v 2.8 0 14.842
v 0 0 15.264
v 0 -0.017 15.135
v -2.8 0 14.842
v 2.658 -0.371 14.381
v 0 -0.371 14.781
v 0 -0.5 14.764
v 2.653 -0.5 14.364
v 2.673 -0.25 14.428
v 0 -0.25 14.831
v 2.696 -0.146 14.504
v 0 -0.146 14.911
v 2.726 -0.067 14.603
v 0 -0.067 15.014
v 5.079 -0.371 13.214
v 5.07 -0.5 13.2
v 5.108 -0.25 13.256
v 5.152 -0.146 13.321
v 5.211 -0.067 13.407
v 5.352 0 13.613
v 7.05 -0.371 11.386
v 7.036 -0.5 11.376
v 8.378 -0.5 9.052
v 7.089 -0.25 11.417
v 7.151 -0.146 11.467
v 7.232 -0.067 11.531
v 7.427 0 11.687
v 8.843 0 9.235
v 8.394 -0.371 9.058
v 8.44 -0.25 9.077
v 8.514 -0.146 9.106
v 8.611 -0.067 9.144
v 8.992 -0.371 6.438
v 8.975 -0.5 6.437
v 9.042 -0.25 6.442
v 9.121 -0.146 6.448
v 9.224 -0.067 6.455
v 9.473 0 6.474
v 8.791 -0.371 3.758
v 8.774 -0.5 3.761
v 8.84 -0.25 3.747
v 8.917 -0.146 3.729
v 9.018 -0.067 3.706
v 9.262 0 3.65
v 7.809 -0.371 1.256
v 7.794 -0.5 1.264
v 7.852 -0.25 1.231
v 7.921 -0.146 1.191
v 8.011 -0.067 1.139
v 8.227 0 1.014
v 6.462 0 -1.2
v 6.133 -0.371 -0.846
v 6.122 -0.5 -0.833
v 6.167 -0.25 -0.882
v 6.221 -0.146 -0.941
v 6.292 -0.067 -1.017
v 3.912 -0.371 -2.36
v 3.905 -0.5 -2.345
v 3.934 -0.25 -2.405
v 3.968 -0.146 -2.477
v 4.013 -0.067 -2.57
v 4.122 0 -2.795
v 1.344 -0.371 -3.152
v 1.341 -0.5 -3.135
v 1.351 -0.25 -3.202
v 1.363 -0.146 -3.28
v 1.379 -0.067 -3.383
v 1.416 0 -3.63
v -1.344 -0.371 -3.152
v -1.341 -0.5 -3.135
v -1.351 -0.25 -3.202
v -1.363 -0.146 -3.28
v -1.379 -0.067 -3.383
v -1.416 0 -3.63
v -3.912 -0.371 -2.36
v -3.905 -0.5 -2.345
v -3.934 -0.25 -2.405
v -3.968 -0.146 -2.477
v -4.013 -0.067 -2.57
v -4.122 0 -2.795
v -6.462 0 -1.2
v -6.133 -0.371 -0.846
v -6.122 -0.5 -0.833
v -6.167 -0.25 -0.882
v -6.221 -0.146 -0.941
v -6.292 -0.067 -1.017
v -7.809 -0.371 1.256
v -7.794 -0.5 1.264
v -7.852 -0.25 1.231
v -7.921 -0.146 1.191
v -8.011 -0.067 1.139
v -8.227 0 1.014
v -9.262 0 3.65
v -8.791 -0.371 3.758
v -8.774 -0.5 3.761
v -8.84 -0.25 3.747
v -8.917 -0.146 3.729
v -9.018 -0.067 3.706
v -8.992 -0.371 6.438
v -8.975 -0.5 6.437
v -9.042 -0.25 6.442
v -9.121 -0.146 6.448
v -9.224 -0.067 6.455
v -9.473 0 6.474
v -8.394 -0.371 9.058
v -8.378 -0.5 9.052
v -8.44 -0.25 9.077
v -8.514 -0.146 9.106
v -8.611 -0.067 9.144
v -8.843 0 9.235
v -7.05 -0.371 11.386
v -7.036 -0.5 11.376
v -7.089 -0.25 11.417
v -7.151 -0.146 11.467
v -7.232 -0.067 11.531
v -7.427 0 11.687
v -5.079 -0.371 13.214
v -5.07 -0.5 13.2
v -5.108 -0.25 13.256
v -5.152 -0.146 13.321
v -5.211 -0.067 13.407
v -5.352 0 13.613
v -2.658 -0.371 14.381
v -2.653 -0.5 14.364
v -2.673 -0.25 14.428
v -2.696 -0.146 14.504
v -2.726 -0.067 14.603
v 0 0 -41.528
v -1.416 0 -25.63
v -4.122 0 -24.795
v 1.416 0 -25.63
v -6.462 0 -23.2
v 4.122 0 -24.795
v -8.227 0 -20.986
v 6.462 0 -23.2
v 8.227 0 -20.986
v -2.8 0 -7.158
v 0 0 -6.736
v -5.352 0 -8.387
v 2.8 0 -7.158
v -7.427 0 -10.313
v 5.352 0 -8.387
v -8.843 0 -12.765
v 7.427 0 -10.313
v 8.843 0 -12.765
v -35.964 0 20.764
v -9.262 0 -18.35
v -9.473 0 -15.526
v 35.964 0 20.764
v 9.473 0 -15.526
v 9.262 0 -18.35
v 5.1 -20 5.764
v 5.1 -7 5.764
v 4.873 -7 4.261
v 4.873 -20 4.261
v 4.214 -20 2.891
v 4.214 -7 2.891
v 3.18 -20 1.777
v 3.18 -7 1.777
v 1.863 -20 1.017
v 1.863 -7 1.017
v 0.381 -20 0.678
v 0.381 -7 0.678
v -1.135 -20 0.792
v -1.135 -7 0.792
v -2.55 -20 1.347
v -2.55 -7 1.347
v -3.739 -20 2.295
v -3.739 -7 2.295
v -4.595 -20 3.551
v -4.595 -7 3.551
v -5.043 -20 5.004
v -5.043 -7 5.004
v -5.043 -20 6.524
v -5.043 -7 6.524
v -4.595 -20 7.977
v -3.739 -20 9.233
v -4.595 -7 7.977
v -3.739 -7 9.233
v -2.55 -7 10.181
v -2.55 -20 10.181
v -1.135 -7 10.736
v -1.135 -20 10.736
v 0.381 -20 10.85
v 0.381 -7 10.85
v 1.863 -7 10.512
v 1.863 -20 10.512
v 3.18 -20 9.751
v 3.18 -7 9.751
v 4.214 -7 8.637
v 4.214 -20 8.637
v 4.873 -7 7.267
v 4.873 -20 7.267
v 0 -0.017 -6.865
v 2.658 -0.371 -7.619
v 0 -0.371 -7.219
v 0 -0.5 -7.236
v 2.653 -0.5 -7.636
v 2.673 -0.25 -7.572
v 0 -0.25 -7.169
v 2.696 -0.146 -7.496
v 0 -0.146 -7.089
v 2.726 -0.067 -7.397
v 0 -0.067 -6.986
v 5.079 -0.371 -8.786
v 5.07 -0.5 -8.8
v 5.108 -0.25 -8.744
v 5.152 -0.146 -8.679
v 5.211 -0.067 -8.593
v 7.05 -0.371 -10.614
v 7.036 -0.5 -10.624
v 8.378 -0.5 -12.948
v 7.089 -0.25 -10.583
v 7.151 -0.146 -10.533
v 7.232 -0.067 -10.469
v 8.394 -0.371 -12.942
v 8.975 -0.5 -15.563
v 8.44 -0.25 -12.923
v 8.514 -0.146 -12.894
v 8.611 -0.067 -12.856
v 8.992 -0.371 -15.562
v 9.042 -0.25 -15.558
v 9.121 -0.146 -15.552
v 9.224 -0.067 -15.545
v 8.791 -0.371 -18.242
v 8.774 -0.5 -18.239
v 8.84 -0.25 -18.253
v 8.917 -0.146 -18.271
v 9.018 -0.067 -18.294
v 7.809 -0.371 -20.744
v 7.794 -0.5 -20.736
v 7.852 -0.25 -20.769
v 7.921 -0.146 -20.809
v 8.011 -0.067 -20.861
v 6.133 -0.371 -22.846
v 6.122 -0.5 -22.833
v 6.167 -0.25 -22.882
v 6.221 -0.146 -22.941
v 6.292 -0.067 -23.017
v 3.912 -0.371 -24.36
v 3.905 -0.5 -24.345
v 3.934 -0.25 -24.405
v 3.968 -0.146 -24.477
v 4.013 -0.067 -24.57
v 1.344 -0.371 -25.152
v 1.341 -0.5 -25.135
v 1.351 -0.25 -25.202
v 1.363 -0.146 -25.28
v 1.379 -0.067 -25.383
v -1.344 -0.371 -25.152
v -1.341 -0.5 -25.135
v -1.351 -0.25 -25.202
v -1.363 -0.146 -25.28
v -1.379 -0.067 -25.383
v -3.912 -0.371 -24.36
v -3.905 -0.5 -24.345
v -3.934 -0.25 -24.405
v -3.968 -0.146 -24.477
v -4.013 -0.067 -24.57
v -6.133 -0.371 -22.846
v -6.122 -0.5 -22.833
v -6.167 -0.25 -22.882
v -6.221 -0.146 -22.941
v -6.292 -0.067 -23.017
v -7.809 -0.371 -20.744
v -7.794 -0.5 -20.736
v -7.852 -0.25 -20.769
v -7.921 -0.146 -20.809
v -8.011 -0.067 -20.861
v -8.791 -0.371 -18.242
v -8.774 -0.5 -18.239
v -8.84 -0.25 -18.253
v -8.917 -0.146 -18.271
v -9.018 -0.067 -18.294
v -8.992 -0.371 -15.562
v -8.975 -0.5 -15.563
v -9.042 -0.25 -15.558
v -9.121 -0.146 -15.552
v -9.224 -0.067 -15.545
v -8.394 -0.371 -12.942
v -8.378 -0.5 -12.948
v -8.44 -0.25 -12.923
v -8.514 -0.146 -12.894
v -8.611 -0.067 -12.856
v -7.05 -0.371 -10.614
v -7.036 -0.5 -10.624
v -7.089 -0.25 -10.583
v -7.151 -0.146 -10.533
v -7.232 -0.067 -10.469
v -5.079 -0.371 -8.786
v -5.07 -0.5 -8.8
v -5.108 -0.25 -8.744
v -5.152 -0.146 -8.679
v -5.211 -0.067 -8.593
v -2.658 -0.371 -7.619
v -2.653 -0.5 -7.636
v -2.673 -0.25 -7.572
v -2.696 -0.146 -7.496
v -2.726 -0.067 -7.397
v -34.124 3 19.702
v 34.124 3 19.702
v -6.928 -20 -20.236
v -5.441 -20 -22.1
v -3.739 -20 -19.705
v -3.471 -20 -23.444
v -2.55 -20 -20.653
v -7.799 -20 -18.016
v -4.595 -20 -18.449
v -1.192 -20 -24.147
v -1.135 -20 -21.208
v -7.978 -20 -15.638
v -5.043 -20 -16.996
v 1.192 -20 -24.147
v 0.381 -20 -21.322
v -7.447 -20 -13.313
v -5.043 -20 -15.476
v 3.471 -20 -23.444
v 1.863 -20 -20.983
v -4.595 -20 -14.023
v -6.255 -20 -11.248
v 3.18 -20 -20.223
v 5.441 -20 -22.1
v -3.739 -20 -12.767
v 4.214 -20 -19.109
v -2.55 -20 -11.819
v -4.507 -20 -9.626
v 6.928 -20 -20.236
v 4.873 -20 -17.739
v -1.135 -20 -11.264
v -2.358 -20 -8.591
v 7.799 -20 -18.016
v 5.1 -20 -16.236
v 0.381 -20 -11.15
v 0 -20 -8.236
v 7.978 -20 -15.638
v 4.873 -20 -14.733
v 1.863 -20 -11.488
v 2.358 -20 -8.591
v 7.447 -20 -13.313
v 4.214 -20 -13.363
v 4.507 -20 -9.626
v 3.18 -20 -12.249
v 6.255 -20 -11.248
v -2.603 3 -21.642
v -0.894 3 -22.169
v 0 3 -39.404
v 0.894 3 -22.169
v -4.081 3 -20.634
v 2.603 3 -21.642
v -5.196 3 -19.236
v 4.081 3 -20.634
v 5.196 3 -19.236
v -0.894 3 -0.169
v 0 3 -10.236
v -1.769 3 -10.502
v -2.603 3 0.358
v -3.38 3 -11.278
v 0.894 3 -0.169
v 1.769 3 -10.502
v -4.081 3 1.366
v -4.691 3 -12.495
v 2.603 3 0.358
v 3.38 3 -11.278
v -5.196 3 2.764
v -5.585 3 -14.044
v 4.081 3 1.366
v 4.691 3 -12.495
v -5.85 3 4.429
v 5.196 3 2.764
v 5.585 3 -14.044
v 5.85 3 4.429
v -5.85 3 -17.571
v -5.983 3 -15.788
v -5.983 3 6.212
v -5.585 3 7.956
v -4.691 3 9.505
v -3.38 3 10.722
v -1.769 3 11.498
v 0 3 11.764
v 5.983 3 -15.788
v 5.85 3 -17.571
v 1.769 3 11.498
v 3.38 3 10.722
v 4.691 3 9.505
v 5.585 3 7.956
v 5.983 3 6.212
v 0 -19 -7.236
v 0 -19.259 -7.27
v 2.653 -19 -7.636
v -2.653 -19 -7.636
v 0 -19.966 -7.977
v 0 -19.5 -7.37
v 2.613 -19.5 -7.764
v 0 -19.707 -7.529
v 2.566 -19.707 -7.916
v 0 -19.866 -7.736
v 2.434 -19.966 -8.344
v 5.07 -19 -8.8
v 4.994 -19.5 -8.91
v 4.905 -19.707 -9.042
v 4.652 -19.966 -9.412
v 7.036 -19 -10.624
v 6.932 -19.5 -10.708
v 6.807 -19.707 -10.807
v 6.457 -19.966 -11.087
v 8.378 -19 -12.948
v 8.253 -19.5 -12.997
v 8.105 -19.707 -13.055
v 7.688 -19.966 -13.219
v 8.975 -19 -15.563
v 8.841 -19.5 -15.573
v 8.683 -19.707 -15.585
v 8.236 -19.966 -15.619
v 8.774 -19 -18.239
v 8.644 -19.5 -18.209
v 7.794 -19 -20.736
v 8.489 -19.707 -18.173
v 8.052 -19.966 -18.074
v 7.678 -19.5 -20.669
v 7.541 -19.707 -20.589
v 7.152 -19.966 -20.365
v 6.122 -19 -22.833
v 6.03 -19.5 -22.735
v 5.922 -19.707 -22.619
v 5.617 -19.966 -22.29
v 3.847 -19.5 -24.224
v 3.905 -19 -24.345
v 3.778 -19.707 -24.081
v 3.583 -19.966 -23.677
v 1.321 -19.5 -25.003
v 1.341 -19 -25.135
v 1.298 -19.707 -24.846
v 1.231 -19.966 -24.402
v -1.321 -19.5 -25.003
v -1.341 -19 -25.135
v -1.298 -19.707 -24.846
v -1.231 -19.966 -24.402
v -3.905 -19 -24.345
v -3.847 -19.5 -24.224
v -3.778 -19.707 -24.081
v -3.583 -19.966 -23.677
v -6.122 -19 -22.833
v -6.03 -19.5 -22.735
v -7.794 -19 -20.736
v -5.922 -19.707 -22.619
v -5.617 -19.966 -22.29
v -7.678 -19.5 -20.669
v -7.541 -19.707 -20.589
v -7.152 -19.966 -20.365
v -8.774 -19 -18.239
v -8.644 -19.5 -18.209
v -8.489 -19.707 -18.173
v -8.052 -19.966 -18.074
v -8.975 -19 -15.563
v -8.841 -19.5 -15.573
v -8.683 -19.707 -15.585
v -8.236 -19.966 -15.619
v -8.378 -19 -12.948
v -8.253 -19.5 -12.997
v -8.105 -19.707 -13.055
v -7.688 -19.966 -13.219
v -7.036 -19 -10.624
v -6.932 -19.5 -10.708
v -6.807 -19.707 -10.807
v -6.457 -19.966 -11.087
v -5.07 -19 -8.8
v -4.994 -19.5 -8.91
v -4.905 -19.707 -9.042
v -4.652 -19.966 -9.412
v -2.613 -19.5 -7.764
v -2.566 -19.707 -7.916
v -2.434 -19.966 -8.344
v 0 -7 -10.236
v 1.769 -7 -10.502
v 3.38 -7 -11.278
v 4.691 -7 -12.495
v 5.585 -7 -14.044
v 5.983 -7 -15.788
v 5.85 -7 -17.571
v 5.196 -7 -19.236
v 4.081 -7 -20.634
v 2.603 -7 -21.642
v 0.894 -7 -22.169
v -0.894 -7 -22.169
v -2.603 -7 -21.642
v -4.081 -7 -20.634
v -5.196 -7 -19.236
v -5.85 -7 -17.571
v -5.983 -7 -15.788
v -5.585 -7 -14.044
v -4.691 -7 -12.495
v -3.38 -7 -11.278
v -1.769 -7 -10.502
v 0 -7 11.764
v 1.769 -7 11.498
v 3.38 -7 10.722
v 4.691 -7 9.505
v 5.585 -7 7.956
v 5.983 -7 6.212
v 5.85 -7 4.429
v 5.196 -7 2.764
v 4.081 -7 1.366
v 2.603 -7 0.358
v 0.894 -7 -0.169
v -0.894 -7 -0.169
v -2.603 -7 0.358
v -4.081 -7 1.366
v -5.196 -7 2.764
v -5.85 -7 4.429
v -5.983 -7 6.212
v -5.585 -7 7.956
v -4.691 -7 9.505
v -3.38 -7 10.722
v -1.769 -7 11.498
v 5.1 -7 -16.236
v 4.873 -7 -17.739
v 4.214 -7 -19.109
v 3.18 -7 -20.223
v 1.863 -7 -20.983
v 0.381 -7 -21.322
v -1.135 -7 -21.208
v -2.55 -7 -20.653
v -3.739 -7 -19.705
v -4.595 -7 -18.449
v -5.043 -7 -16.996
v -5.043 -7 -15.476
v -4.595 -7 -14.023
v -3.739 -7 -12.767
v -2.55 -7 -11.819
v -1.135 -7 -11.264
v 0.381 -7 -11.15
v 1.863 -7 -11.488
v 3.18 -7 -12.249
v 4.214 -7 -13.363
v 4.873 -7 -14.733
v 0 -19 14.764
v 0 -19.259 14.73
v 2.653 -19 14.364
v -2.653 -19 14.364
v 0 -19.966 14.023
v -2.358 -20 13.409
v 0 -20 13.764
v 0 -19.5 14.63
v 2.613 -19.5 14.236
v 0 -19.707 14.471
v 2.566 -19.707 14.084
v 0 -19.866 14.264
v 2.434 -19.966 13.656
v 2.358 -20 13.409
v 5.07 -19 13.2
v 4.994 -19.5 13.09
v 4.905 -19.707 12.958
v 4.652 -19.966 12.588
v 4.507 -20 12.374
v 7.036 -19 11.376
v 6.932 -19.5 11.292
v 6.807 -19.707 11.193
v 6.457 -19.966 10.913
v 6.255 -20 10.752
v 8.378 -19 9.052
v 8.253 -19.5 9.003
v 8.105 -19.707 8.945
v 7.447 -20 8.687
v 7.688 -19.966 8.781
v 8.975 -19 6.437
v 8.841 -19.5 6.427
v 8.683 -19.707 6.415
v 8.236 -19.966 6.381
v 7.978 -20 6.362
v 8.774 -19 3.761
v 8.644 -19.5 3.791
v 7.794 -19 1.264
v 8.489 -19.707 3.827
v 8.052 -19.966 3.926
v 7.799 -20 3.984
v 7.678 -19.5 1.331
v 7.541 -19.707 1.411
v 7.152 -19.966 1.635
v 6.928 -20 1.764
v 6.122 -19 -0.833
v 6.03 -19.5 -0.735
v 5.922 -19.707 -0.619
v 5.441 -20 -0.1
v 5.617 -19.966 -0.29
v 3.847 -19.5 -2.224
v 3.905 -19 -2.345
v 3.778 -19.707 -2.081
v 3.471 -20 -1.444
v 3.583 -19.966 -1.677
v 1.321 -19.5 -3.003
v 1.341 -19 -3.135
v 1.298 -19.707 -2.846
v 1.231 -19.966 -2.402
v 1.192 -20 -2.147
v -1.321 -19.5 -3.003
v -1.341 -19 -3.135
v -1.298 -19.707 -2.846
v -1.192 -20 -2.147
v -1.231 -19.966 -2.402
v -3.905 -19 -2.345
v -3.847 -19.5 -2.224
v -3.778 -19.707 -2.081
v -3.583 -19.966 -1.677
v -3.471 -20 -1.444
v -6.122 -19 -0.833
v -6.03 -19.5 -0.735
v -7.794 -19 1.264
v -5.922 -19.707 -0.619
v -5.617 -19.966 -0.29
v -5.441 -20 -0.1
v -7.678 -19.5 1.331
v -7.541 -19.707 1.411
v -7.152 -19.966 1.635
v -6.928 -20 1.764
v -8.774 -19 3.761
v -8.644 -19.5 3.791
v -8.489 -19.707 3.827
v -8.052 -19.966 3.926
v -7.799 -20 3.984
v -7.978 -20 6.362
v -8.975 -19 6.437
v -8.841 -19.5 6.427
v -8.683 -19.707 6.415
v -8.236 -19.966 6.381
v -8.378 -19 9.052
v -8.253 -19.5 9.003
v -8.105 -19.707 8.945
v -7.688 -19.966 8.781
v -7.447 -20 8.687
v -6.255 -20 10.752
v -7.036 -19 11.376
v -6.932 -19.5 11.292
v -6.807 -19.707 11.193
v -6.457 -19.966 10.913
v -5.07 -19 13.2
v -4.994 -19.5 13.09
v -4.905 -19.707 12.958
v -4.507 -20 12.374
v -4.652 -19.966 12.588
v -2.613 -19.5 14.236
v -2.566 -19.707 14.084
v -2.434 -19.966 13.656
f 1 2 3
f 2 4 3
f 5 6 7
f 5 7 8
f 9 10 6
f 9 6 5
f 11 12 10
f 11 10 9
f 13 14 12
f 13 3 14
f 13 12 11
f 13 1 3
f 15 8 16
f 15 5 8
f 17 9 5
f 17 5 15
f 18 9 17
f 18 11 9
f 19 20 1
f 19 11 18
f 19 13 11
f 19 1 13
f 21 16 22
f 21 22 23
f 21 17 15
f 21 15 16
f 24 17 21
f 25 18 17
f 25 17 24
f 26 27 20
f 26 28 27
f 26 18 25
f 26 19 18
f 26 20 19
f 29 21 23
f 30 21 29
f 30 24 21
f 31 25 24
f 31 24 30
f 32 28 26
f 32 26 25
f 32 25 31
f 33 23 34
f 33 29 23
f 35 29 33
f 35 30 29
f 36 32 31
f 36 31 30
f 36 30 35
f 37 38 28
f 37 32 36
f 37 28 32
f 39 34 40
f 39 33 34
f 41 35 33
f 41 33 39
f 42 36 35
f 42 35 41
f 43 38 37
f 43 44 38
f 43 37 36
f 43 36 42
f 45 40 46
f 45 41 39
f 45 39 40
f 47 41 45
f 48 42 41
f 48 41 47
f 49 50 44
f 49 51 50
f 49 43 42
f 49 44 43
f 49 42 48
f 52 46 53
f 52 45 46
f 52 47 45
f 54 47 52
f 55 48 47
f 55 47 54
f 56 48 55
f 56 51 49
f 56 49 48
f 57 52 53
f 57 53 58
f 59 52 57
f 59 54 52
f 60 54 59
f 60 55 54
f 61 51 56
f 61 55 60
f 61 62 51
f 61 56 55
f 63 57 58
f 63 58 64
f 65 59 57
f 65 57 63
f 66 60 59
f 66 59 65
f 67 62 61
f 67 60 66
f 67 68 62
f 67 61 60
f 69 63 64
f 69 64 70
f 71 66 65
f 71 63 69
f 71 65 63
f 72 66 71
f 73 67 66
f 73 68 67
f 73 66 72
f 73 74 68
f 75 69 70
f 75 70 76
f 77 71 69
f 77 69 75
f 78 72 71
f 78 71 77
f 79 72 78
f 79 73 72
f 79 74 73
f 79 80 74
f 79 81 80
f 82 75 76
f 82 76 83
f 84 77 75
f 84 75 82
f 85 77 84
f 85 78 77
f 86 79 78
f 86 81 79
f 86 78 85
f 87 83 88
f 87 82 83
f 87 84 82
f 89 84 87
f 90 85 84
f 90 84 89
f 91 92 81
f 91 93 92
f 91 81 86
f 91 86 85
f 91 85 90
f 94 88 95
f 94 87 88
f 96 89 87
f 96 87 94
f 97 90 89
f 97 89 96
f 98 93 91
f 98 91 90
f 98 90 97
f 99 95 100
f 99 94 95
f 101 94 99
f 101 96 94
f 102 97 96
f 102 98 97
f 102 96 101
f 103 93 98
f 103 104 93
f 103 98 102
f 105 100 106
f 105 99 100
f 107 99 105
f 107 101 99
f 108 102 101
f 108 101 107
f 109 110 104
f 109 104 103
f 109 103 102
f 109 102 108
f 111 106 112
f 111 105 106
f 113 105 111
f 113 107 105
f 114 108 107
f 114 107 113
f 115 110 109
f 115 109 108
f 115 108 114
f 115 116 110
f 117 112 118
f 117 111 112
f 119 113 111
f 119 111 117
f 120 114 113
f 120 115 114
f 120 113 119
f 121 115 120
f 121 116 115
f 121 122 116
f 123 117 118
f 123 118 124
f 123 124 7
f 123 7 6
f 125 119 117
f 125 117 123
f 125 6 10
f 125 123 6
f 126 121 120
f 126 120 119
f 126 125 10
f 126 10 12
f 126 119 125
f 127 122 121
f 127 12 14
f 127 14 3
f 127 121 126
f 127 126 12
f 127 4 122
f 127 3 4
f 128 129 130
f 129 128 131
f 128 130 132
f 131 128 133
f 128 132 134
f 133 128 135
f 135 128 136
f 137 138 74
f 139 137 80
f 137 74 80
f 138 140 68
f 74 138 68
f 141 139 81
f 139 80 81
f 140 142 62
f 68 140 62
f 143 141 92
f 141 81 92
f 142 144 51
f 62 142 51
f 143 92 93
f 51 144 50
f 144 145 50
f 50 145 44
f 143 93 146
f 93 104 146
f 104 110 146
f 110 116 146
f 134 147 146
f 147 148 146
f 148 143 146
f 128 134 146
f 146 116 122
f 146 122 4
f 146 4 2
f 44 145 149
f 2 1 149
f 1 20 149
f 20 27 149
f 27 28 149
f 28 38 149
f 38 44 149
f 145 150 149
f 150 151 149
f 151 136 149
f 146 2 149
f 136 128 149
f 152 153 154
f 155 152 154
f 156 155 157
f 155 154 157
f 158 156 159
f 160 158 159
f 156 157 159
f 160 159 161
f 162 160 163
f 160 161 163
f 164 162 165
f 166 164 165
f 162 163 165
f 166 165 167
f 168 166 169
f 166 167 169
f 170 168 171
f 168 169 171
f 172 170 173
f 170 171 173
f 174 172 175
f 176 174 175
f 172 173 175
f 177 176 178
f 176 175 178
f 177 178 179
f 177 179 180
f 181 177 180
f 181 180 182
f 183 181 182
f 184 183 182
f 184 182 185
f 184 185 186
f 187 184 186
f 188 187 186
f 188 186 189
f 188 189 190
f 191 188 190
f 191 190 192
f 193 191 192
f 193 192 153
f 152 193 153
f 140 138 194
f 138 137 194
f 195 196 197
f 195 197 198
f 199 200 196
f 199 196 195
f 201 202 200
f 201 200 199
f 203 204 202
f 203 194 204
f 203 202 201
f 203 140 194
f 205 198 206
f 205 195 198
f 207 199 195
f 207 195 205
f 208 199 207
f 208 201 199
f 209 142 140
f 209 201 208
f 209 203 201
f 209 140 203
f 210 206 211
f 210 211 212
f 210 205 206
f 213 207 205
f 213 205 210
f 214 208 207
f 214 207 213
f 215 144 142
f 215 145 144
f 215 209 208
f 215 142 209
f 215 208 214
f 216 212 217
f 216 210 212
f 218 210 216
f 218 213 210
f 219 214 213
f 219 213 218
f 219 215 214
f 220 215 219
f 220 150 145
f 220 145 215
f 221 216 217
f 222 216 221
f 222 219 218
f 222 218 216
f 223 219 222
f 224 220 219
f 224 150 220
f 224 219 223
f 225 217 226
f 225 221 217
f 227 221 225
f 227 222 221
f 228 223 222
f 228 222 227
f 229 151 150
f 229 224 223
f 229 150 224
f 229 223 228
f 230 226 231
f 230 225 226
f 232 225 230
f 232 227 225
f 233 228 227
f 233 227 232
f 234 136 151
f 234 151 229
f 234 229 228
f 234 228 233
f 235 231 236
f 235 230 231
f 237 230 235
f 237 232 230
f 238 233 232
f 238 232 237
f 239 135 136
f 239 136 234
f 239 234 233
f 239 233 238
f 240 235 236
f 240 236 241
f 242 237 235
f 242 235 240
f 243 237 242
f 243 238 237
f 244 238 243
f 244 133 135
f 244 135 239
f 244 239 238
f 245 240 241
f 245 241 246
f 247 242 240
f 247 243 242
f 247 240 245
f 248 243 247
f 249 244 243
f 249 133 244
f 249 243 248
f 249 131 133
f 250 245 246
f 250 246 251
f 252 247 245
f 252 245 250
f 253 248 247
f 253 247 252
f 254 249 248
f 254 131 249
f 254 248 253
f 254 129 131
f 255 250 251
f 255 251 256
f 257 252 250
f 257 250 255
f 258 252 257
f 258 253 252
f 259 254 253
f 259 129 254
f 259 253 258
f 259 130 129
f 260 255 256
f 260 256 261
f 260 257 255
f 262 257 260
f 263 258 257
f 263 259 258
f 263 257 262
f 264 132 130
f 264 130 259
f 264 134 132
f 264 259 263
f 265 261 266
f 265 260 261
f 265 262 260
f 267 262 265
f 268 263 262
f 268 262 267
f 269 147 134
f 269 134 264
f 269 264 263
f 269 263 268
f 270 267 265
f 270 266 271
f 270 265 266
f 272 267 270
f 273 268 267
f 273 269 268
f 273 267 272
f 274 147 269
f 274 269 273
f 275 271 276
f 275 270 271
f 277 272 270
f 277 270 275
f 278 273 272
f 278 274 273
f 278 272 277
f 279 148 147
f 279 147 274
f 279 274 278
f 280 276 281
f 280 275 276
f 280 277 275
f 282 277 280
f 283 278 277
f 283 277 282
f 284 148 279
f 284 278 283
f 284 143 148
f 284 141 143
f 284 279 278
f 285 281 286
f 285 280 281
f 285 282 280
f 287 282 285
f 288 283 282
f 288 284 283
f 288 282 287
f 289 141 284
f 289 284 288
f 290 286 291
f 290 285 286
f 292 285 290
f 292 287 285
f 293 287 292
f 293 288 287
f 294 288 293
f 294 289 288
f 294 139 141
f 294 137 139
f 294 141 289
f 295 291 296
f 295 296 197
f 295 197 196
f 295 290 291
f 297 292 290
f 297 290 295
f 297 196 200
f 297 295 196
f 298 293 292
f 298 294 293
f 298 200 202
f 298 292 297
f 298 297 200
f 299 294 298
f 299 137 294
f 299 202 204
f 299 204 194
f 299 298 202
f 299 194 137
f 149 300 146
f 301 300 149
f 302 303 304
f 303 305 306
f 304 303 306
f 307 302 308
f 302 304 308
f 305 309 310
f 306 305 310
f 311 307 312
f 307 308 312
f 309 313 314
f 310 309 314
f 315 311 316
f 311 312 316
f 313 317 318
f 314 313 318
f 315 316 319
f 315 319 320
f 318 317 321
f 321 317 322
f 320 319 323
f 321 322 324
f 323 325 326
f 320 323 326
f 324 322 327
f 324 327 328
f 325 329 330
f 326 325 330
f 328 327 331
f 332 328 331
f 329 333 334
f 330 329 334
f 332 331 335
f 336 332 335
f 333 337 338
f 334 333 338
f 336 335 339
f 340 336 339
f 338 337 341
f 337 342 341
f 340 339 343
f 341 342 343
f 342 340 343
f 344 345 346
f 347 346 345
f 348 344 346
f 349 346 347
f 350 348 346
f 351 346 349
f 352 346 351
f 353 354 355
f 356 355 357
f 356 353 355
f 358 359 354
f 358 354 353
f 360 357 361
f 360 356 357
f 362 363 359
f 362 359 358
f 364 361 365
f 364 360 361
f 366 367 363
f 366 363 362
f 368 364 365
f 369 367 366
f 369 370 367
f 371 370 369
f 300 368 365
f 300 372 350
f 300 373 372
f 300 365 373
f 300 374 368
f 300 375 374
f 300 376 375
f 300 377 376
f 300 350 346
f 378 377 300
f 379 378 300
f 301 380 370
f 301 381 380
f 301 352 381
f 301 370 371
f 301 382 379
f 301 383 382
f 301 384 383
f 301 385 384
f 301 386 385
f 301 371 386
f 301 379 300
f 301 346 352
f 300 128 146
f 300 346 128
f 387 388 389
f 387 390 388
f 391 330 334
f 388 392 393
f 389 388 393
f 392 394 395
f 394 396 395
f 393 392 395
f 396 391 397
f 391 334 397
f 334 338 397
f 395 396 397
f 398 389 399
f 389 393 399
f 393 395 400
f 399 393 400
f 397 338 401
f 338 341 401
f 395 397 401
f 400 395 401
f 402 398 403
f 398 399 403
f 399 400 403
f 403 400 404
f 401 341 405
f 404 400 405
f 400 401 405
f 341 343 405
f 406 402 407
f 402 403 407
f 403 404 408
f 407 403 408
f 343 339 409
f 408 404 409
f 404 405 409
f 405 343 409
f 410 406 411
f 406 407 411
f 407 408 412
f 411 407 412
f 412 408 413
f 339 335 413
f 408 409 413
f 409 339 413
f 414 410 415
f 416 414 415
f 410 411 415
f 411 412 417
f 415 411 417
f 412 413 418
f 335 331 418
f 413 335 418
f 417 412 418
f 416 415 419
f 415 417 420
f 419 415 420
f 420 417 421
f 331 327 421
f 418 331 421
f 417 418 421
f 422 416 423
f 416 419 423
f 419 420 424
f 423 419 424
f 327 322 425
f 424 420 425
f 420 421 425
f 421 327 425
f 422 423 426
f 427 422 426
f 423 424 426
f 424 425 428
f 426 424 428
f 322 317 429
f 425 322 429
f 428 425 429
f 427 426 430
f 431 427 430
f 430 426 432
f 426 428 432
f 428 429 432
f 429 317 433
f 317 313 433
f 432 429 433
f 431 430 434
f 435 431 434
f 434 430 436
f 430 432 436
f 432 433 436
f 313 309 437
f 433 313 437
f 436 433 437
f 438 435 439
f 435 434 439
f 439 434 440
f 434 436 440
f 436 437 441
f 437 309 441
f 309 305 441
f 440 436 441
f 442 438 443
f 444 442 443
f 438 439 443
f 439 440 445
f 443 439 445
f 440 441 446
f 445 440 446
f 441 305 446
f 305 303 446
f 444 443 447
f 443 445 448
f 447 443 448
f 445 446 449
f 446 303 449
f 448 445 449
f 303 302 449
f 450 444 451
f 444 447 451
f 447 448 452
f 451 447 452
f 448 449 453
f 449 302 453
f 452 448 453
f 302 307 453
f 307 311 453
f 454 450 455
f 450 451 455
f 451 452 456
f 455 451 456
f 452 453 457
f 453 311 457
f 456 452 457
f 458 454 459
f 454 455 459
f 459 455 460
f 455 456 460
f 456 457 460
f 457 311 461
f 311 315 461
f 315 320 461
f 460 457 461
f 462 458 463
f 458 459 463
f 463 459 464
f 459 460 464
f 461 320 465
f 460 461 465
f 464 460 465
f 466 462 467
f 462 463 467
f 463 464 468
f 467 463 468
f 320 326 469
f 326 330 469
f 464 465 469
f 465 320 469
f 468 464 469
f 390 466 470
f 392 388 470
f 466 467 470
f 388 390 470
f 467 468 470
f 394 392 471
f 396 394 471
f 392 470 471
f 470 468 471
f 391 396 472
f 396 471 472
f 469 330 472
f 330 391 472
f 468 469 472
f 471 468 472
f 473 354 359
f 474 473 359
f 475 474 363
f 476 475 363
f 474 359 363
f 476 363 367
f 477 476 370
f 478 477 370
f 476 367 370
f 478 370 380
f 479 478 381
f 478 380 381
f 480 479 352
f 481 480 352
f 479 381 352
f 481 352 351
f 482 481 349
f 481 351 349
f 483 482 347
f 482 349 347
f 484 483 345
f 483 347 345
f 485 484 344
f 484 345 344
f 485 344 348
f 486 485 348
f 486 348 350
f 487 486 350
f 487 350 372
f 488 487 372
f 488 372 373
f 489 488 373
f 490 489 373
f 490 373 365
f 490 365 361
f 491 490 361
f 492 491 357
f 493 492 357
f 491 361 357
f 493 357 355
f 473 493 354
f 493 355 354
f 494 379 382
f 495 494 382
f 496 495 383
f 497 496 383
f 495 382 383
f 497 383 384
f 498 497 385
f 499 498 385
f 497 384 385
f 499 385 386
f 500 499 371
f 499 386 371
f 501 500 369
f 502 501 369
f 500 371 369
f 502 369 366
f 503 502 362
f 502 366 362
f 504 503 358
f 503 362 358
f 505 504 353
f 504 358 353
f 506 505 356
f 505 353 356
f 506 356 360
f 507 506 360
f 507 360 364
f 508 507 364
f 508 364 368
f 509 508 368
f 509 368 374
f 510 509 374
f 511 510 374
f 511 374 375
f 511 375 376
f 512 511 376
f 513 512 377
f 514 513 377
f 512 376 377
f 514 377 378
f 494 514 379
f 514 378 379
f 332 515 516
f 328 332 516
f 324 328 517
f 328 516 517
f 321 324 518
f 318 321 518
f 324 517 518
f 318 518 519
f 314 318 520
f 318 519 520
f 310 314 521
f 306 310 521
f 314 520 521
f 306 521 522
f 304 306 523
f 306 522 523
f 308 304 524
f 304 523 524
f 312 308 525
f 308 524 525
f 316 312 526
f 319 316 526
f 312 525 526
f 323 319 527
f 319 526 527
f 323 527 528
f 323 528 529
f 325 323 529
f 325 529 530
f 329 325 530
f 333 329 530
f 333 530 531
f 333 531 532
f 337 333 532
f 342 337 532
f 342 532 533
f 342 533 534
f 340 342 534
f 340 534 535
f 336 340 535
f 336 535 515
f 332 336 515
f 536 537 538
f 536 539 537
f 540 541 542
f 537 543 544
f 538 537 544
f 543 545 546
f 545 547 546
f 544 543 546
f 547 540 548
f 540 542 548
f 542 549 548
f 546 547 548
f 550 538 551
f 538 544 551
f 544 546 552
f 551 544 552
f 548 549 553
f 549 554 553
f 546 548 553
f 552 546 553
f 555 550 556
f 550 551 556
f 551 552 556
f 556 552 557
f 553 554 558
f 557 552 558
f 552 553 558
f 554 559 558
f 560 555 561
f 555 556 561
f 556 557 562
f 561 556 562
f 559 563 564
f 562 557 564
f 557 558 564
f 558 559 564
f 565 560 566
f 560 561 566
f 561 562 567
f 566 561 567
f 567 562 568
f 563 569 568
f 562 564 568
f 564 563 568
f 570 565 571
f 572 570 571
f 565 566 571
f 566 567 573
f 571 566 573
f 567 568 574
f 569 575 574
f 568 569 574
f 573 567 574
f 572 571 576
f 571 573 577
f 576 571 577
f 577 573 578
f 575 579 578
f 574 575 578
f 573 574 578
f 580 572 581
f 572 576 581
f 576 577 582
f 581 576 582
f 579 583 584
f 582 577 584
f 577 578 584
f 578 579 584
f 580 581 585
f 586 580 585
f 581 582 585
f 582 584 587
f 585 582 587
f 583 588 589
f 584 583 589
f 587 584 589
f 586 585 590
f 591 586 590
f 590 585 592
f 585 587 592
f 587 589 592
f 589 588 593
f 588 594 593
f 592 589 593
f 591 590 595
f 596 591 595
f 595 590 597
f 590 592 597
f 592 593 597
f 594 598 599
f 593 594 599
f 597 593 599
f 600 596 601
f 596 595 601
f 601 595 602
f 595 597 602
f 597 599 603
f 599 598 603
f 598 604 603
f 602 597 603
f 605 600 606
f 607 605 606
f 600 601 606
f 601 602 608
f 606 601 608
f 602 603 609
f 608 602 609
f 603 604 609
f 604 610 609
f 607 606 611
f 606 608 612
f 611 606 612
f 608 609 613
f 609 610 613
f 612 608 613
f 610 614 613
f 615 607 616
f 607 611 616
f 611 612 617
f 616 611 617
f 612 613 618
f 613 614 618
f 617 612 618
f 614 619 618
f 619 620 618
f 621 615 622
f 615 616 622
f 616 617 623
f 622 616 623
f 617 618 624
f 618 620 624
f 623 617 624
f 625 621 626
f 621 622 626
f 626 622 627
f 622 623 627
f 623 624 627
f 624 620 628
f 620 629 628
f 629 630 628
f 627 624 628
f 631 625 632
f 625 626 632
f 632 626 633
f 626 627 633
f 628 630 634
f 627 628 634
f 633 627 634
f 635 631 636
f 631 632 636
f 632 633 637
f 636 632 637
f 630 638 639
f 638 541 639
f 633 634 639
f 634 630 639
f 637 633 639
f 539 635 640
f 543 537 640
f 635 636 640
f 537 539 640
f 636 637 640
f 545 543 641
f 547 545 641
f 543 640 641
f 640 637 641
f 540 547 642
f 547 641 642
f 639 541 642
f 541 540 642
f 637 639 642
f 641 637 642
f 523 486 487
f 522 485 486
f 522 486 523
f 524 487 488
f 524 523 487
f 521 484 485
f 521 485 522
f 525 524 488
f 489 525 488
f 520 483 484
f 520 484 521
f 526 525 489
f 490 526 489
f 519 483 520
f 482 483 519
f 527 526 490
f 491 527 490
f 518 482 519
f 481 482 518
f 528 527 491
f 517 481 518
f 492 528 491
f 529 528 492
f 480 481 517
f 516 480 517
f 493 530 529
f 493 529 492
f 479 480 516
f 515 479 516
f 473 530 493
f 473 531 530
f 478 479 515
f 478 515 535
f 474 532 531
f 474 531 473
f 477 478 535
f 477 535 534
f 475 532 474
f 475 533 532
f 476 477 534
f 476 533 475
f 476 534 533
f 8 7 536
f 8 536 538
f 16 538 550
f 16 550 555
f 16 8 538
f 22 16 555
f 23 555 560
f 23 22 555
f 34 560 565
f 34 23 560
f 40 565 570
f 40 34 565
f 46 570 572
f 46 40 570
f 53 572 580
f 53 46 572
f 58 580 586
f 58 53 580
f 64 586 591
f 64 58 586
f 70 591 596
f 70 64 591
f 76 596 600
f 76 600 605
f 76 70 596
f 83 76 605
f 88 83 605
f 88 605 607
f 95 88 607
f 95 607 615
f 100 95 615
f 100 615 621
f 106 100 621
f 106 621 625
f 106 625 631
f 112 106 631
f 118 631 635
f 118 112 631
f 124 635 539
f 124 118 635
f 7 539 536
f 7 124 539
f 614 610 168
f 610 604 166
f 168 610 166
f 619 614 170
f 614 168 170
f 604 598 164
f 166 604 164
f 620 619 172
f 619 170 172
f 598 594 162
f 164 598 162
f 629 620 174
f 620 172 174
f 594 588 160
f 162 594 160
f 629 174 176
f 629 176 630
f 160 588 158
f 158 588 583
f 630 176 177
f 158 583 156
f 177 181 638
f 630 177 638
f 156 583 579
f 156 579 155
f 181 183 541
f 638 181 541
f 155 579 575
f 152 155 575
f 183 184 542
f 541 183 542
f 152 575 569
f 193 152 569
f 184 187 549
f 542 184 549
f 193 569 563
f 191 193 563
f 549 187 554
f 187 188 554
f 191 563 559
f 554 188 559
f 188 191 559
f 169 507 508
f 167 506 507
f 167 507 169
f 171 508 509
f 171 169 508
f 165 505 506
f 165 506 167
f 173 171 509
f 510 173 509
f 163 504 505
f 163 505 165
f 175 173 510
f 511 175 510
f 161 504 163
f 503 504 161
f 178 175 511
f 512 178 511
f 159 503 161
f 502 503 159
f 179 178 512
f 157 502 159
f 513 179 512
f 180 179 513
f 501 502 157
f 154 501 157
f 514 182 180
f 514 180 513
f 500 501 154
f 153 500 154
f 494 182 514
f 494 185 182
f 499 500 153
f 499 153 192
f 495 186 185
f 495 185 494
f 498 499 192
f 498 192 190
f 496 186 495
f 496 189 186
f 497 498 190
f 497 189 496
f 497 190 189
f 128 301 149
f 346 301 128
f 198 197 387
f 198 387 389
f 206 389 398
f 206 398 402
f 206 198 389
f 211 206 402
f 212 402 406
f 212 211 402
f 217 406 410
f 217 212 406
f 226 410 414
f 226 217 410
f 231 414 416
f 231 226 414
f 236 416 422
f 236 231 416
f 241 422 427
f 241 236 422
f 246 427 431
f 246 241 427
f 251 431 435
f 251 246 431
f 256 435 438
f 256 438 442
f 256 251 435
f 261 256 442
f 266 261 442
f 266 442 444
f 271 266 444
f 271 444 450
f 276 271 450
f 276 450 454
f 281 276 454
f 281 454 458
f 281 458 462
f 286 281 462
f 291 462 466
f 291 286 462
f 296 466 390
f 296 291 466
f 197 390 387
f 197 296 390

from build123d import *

# Parameters (mm, degrees)
BOSS_EXTRUDE1_DEPTH    = 3
BOSS_EXTRUDE1_TAPER    = 19.5
BOSS_EXTRUDE2_START    = -3
SKETCH3_R              = 9
BOSS_EXTRUDE2_DEPTH    = 20
SKETCH4_R              = 6
CUT_EXTRUDE1_DEPTH     = 10
M12_TAPPED_HOLE1_D     = 10.2
FILLET1_R              = 1
FILLET2_R              = 0.5
LPATTERN1_COUNT        = 2
LPATTERN1_PITCH        = 22
FILLET1_OF_LPATTERN1_R = 1
FILLET2_OF_LPATTERN1_R = 0.5


with BuildPart() as part:
    # Sketch1 → Boss-Extrude1 (new body)
    with BuildSketch(Plane(origin=(0, 0, 0), x_dir=(1, 0, 0), z_dir=(0, 1, 0))):
        Polygon((0, 41.528227513), (-35.9645, -20.764113756), (35.9645, -20.764113756), align=None)
    extrude(amount=BOSS_EXTRUDE1_DEPTH, taper=BOSS_EXTRUDE1_TAPER)

    # Sketch3 → Boss-Extrude2 (add)
    with BuildSketch(Plane(origin=(0, 3, 0), x_dir=(1, 0, 0), z_dir=(0, 1, 0)).offset(BOSS_EXTRUDE2_START)):
        with Locations(Location((0, 16.235886244, 0), (0, 0, 270))):
            Circle(SKETCH3_R)
    boss_extrude2 = extrude(amount=-BOSS_EXTRUDE2_DEPTH)

    # Sketch4 → Cut-Extrude1 (cut)
    with BuildSketch(Plane(origin=(0, 3, 0), x_dir=(1, 0, 0), z_dir=(0, 1, 0))):
        with Locations(Location((0, 16.235886244, 0), (0, 0, 270))):
            Circle(SKETCH4_R)
    cut_extrude1 = extrude(amount=-CUT_EXTRUDE1_DEPTH, mode=Mode.SUBTRACT)

    # M12 Tapped Hole1 (through all)
    with Locations(Plane(origin=(0, -20, 0), x_dir=(-1, 0, 0), z_dir=(0, -1, 0))):
        with Locations((0, 16.235886244)):
            m12_tapped_hole1 = Hole(M12_TAPPED_HOLE1_D / 2)

    # Fillet1
    fillet1_edges = [part.edges().sort_by_distance(p)[0] for p in [
        (0, -20, -25.235886244),
    ]]
    fillet(fillet1_edges, radius=FILLET1_R)

    # Fillet2
    fillet2_edges = [part.edges().sort_by_distance(p)[0] for p in [
        (0, 0, -25.235886244),
    ]]
    fillet(fillet2_edges, radius=FILLET2_R)

    # LPattern1: Boss-Extrude2, Cut-Extrude1, M12 Tapped Hole1 ×2
    with Locations(*[(0, 0, i * LPATTERN1_PITCH) for i in range(1, LPATTERN1_COUNT)]):
        add(boss_extrude2)
        add(cut_extrude1, mode=Mode.SUBTRACT)
        add(m12_tapped_hole1, mode=Mode.SUBTRACT)

    # Fillet1 of LPattern1
    fillet1_of_lpattern1_edges = [part.edges().sort_by_distance(p)[0] for p in [
        (0, -20, -3.235886244),
    ]]
    fillet(fillet1_of_lpattern1_edges, radius=FILLET1_OF_LPATTERN1_R)

    # Fillet2 of LPattern1
    fillet2_of_lpattern1_edges = [part.edges().sort_by_distance(p)[0] for p in [
        (0, 0, -3.235886244),
    ]]
    fillet(fillet2_of_lpattern1_edges, radius=FILLET2_OF_LPATTERN1_R)


solid = part.part
